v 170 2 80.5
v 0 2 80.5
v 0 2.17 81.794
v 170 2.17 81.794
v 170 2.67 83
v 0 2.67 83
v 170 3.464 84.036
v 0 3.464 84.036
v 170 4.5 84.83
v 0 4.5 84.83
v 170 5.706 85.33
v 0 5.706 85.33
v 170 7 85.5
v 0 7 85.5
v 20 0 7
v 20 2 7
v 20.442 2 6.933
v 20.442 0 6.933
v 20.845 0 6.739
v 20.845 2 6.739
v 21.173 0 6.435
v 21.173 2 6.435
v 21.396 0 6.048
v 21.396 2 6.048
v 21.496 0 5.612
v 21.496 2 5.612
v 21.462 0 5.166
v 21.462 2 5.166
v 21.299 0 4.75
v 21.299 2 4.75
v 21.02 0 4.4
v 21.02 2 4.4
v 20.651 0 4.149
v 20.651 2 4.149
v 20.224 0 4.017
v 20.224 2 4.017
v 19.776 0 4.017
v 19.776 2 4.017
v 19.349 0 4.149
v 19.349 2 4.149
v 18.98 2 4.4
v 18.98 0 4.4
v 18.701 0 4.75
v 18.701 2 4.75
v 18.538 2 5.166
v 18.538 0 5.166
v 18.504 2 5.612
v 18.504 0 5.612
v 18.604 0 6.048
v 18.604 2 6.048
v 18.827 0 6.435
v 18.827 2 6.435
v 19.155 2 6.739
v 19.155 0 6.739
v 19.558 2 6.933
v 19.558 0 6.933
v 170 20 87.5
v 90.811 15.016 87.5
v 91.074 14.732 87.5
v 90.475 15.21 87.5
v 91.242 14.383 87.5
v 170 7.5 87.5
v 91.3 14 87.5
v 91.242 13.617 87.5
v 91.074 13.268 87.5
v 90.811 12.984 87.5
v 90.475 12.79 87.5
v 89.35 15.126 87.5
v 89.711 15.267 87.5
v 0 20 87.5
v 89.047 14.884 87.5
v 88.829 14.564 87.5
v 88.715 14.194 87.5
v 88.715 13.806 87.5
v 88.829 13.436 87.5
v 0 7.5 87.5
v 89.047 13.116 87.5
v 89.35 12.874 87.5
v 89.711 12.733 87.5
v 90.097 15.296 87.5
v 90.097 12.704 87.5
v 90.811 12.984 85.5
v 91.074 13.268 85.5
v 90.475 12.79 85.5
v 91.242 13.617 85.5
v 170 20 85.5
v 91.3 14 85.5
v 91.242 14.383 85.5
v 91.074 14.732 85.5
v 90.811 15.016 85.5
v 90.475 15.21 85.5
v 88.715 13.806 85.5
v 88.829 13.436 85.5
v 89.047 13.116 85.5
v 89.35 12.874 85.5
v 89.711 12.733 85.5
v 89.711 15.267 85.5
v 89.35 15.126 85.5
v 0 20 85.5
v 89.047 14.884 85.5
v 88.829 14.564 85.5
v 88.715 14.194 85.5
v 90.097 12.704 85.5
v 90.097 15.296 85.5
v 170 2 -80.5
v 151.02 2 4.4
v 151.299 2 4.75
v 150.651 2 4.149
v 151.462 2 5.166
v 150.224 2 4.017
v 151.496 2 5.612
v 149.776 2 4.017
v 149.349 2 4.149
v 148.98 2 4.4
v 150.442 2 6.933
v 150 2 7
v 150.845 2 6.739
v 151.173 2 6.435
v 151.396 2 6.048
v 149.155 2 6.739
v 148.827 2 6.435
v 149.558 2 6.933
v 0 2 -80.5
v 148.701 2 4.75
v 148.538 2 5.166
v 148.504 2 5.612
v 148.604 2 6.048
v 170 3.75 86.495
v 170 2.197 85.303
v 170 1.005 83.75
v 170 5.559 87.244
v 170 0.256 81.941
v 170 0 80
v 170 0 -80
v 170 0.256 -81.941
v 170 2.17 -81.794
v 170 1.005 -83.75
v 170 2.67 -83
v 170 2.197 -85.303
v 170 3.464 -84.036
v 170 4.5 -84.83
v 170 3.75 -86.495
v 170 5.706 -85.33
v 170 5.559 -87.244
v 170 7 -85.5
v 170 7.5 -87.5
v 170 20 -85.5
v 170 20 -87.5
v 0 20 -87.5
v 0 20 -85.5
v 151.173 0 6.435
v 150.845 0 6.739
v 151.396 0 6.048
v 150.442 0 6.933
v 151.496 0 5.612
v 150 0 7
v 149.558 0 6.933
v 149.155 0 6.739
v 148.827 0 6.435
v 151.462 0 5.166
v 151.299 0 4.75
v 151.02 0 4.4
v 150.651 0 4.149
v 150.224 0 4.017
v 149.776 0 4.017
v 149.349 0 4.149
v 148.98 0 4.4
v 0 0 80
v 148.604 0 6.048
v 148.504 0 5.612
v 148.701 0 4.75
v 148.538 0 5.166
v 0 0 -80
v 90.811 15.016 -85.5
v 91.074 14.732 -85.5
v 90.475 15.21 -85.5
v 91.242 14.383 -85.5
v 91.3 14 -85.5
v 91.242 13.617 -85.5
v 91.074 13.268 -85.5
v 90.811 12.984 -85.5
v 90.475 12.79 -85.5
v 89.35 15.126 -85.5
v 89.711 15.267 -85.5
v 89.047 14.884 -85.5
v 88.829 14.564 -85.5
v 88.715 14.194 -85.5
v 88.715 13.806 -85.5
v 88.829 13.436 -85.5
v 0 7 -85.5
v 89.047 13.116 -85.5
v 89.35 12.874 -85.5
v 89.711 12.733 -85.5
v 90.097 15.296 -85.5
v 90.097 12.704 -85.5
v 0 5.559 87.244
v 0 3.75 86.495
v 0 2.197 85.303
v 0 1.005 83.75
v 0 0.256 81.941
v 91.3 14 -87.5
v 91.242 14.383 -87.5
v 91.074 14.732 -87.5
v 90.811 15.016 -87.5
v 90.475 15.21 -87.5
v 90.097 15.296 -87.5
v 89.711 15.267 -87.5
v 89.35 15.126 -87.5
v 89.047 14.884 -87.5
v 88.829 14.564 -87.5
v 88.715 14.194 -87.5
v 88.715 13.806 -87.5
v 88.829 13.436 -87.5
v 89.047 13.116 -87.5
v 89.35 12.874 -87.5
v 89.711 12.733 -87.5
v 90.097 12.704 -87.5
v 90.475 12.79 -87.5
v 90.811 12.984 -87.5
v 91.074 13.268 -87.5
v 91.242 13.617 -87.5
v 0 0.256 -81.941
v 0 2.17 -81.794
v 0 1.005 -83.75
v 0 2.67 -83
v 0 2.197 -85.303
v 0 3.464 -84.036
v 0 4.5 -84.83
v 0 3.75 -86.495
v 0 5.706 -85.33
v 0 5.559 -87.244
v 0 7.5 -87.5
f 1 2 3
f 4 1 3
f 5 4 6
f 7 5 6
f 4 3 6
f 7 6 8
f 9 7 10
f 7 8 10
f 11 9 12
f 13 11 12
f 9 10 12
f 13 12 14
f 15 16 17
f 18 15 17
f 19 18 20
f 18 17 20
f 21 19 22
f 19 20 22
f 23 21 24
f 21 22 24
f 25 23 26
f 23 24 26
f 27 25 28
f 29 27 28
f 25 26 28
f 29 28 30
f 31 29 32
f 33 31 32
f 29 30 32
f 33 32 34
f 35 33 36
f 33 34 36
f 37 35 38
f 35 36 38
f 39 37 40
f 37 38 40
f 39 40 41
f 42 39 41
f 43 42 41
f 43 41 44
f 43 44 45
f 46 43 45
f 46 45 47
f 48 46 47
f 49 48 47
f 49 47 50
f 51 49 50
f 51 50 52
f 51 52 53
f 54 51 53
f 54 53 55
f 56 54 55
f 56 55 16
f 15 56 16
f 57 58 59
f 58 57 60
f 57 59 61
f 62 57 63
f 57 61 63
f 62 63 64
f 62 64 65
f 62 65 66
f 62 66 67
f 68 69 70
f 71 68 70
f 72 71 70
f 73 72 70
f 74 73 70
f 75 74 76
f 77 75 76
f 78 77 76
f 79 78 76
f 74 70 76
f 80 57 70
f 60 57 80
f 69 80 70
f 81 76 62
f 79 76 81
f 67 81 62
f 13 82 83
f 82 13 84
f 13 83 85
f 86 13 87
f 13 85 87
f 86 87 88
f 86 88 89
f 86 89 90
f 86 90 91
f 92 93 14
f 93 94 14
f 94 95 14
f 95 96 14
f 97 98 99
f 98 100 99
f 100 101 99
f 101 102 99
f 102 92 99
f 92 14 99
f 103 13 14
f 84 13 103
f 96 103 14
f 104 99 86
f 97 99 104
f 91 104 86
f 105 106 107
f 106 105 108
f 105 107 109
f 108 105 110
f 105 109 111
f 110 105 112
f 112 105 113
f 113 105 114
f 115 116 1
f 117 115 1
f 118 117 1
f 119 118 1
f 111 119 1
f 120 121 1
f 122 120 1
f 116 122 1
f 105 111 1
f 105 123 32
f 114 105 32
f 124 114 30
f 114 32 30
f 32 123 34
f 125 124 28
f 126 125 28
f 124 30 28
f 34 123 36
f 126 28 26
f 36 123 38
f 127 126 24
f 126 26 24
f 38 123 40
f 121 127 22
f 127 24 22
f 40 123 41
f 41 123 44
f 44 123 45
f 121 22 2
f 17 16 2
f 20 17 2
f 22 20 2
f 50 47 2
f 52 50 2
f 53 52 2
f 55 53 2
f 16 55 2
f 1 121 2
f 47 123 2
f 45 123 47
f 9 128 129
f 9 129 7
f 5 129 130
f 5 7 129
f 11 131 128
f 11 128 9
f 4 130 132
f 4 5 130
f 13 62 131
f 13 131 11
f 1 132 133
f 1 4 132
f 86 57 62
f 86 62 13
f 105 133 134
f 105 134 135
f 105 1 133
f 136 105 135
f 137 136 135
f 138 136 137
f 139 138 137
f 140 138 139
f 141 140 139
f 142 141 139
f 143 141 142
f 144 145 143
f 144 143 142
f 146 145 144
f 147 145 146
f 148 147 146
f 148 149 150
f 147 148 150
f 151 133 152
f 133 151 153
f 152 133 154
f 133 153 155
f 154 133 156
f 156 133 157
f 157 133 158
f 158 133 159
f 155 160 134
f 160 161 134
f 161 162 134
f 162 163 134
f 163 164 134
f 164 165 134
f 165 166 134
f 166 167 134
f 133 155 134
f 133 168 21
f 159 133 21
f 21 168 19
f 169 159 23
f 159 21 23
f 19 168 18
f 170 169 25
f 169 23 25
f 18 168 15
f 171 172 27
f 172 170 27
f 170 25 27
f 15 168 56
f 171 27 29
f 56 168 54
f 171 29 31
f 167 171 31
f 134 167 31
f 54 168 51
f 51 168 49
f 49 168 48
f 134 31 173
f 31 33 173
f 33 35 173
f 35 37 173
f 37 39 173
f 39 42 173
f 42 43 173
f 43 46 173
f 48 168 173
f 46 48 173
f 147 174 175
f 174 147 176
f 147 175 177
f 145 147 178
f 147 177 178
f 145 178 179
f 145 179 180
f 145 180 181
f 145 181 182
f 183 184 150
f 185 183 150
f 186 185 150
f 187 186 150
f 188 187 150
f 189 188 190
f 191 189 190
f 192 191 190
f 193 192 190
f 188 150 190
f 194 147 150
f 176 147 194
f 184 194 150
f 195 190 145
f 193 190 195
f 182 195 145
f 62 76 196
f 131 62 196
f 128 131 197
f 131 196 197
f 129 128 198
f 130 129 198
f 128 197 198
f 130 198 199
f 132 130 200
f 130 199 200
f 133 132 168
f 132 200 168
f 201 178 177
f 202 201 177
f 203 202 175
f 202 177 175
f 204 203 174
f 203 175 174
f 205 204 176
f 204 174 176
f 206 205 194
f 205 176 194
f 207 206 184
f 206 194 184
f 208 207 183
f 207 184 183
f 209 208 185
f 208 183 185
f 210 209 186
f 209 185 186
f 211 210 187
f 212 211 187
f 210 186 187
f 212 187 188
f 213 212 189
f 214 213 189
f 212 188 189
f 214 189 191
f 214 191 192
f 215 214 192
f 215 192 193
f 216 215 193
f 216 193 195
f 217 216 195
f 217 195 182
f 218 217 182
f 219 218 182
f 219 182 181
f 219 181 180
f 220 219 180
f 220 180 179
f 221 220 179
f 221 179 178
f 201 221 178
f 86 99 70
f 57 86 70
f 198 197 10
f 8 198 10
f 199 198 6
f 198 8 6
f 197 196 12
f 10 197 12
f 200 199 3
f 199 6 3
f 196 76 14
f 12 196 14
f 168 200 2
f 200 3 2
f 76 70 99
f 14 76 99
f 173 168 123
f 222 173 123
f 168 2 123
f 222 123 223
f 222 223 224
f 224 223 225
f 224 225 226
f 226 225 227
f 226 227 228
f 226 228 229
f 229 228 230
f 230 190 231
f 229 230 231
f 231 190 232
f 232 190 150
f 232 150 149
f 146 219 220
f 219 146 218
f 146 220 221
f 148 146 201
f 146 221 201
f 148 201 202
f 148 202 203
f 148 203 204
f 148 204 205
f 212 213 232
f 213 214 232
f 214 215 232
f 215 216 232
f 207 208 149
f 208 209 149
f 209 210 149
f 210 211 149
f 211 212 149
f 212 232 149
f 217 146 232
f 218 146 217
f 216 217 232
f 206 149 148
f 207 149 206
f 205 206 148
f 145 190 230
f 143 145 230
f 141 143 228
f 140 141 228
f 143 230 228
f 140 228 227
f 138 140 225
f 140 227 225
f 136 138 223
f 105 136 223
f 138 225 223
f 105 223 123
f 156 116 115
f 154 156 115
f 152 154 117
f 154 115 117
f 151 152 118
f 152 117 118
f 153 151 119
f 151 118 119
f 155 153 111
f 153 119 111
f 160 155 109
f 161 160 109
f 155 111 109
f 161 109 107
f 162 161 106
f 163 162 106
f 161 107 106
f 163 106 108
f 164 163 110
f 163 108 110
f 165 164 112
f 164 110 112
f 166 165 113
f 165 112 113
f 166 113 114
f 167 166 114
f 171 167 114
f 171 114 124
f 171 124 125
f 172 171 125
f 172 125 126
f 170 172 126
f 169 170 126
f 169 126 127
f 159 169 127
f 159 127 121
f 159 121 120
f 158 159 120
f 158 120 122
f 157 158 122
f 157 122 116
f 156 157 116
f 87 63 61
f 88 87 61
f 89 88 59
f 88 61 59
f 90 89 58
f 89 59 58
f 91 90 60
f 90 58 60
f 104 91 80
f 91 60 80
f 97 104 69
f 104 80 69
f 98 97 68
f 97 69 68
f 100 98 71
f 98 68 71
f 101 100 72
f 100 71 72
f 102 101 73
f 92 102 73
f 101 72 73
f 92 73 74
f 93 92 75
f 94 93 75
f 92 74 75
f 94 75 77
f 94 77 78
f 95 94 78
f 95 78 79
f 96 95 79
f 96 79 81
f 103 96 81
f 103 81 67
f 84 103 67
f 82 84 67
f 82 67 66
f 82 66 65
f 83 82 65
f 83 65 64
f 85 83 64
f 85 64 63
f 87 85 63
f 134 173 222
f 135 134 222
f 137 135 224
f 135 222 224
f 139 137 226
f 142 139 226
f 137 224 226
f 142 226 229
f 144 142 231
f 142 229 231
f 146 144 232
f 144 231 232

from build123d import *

# Parameters (mm, degrees)
BOSS_EXTRUDE1_DEPTH = 170
SKETCH3_R           = 1.5
CUT_EXTRUDE2_DEPTH  = 170
SKETCH4_R           = 1.3
CUT_EXTRUDE3_DEPTH  = 200


with BuildPart() as part:
    # Sketch2 → Boss-Extrude1 (new body)
    with BuildSketch(Plane(origin=(0, 0, 0), x_dir=(0, 0, -1), z_dir=(1, 0, 0))):
        with BuildLine():
            Line((-80, 0), (80, 0))
            ThreePointArc((80, 0), (85.303300859, 2.196699141), (87.5, 7.5))
            Line((87.5, 7.5), (87.5, 20))
            Line((87.5, 20), (85.5, 20))
            Line((85.5, 20), (85.5, 7))
            ThreePointArc((85.5, 7), (84.035533906, 3.464466094), (80.5, 2))
            Line((80.5, 2), (-80.5, 2))
            ThreePointArc((-80.5, 2), (-84.035533906, 3.464466094), (-85.5, 7))
            Line((-85.5, 7), (-85.5, 20))
            Line((-85.5, 20), (-87.5, 20))
            Line((-87.5, 20), (-87.5, 7.5))
            ThreePointArc((-87.5, 7.5), (-85.303300859, 2.196699141), (-80, 0))
        make_face()
    extrude(amount=BOSS_EXTRUDE1_DEPTH)

    # Sketch3 → Cut-Extrude2 (cut)
    with BuildSketch(Plane(origin=(0, 2, 0), x_dir=(1, 0, 0), z_dir=(0, 1, 0))):
        with Locations(Location((20, -5.5, 0), (0, 0, 270))):
            Circle(SKETCH3_R)
        with Locations(Location((150, -5.5, 0), (0, 0, 270))):
            Circle(SKETCH3_R)
    extrude(amount=-CUT_EXTRUDE2_DEPTH, mode=Mode.SUBTRACT)

    # Sketch4 → Cut-Extrude3 (cut)
    with BuildSketch(Plane.XY.offset(87.5)):
        with Locations((90, 14)):
            Circle(SKETCH4_R)
    extrude(amount=-CUT_EXTRUDE3_DEPTH, mode=Mode.SUBTRACT)


solid = part.part
